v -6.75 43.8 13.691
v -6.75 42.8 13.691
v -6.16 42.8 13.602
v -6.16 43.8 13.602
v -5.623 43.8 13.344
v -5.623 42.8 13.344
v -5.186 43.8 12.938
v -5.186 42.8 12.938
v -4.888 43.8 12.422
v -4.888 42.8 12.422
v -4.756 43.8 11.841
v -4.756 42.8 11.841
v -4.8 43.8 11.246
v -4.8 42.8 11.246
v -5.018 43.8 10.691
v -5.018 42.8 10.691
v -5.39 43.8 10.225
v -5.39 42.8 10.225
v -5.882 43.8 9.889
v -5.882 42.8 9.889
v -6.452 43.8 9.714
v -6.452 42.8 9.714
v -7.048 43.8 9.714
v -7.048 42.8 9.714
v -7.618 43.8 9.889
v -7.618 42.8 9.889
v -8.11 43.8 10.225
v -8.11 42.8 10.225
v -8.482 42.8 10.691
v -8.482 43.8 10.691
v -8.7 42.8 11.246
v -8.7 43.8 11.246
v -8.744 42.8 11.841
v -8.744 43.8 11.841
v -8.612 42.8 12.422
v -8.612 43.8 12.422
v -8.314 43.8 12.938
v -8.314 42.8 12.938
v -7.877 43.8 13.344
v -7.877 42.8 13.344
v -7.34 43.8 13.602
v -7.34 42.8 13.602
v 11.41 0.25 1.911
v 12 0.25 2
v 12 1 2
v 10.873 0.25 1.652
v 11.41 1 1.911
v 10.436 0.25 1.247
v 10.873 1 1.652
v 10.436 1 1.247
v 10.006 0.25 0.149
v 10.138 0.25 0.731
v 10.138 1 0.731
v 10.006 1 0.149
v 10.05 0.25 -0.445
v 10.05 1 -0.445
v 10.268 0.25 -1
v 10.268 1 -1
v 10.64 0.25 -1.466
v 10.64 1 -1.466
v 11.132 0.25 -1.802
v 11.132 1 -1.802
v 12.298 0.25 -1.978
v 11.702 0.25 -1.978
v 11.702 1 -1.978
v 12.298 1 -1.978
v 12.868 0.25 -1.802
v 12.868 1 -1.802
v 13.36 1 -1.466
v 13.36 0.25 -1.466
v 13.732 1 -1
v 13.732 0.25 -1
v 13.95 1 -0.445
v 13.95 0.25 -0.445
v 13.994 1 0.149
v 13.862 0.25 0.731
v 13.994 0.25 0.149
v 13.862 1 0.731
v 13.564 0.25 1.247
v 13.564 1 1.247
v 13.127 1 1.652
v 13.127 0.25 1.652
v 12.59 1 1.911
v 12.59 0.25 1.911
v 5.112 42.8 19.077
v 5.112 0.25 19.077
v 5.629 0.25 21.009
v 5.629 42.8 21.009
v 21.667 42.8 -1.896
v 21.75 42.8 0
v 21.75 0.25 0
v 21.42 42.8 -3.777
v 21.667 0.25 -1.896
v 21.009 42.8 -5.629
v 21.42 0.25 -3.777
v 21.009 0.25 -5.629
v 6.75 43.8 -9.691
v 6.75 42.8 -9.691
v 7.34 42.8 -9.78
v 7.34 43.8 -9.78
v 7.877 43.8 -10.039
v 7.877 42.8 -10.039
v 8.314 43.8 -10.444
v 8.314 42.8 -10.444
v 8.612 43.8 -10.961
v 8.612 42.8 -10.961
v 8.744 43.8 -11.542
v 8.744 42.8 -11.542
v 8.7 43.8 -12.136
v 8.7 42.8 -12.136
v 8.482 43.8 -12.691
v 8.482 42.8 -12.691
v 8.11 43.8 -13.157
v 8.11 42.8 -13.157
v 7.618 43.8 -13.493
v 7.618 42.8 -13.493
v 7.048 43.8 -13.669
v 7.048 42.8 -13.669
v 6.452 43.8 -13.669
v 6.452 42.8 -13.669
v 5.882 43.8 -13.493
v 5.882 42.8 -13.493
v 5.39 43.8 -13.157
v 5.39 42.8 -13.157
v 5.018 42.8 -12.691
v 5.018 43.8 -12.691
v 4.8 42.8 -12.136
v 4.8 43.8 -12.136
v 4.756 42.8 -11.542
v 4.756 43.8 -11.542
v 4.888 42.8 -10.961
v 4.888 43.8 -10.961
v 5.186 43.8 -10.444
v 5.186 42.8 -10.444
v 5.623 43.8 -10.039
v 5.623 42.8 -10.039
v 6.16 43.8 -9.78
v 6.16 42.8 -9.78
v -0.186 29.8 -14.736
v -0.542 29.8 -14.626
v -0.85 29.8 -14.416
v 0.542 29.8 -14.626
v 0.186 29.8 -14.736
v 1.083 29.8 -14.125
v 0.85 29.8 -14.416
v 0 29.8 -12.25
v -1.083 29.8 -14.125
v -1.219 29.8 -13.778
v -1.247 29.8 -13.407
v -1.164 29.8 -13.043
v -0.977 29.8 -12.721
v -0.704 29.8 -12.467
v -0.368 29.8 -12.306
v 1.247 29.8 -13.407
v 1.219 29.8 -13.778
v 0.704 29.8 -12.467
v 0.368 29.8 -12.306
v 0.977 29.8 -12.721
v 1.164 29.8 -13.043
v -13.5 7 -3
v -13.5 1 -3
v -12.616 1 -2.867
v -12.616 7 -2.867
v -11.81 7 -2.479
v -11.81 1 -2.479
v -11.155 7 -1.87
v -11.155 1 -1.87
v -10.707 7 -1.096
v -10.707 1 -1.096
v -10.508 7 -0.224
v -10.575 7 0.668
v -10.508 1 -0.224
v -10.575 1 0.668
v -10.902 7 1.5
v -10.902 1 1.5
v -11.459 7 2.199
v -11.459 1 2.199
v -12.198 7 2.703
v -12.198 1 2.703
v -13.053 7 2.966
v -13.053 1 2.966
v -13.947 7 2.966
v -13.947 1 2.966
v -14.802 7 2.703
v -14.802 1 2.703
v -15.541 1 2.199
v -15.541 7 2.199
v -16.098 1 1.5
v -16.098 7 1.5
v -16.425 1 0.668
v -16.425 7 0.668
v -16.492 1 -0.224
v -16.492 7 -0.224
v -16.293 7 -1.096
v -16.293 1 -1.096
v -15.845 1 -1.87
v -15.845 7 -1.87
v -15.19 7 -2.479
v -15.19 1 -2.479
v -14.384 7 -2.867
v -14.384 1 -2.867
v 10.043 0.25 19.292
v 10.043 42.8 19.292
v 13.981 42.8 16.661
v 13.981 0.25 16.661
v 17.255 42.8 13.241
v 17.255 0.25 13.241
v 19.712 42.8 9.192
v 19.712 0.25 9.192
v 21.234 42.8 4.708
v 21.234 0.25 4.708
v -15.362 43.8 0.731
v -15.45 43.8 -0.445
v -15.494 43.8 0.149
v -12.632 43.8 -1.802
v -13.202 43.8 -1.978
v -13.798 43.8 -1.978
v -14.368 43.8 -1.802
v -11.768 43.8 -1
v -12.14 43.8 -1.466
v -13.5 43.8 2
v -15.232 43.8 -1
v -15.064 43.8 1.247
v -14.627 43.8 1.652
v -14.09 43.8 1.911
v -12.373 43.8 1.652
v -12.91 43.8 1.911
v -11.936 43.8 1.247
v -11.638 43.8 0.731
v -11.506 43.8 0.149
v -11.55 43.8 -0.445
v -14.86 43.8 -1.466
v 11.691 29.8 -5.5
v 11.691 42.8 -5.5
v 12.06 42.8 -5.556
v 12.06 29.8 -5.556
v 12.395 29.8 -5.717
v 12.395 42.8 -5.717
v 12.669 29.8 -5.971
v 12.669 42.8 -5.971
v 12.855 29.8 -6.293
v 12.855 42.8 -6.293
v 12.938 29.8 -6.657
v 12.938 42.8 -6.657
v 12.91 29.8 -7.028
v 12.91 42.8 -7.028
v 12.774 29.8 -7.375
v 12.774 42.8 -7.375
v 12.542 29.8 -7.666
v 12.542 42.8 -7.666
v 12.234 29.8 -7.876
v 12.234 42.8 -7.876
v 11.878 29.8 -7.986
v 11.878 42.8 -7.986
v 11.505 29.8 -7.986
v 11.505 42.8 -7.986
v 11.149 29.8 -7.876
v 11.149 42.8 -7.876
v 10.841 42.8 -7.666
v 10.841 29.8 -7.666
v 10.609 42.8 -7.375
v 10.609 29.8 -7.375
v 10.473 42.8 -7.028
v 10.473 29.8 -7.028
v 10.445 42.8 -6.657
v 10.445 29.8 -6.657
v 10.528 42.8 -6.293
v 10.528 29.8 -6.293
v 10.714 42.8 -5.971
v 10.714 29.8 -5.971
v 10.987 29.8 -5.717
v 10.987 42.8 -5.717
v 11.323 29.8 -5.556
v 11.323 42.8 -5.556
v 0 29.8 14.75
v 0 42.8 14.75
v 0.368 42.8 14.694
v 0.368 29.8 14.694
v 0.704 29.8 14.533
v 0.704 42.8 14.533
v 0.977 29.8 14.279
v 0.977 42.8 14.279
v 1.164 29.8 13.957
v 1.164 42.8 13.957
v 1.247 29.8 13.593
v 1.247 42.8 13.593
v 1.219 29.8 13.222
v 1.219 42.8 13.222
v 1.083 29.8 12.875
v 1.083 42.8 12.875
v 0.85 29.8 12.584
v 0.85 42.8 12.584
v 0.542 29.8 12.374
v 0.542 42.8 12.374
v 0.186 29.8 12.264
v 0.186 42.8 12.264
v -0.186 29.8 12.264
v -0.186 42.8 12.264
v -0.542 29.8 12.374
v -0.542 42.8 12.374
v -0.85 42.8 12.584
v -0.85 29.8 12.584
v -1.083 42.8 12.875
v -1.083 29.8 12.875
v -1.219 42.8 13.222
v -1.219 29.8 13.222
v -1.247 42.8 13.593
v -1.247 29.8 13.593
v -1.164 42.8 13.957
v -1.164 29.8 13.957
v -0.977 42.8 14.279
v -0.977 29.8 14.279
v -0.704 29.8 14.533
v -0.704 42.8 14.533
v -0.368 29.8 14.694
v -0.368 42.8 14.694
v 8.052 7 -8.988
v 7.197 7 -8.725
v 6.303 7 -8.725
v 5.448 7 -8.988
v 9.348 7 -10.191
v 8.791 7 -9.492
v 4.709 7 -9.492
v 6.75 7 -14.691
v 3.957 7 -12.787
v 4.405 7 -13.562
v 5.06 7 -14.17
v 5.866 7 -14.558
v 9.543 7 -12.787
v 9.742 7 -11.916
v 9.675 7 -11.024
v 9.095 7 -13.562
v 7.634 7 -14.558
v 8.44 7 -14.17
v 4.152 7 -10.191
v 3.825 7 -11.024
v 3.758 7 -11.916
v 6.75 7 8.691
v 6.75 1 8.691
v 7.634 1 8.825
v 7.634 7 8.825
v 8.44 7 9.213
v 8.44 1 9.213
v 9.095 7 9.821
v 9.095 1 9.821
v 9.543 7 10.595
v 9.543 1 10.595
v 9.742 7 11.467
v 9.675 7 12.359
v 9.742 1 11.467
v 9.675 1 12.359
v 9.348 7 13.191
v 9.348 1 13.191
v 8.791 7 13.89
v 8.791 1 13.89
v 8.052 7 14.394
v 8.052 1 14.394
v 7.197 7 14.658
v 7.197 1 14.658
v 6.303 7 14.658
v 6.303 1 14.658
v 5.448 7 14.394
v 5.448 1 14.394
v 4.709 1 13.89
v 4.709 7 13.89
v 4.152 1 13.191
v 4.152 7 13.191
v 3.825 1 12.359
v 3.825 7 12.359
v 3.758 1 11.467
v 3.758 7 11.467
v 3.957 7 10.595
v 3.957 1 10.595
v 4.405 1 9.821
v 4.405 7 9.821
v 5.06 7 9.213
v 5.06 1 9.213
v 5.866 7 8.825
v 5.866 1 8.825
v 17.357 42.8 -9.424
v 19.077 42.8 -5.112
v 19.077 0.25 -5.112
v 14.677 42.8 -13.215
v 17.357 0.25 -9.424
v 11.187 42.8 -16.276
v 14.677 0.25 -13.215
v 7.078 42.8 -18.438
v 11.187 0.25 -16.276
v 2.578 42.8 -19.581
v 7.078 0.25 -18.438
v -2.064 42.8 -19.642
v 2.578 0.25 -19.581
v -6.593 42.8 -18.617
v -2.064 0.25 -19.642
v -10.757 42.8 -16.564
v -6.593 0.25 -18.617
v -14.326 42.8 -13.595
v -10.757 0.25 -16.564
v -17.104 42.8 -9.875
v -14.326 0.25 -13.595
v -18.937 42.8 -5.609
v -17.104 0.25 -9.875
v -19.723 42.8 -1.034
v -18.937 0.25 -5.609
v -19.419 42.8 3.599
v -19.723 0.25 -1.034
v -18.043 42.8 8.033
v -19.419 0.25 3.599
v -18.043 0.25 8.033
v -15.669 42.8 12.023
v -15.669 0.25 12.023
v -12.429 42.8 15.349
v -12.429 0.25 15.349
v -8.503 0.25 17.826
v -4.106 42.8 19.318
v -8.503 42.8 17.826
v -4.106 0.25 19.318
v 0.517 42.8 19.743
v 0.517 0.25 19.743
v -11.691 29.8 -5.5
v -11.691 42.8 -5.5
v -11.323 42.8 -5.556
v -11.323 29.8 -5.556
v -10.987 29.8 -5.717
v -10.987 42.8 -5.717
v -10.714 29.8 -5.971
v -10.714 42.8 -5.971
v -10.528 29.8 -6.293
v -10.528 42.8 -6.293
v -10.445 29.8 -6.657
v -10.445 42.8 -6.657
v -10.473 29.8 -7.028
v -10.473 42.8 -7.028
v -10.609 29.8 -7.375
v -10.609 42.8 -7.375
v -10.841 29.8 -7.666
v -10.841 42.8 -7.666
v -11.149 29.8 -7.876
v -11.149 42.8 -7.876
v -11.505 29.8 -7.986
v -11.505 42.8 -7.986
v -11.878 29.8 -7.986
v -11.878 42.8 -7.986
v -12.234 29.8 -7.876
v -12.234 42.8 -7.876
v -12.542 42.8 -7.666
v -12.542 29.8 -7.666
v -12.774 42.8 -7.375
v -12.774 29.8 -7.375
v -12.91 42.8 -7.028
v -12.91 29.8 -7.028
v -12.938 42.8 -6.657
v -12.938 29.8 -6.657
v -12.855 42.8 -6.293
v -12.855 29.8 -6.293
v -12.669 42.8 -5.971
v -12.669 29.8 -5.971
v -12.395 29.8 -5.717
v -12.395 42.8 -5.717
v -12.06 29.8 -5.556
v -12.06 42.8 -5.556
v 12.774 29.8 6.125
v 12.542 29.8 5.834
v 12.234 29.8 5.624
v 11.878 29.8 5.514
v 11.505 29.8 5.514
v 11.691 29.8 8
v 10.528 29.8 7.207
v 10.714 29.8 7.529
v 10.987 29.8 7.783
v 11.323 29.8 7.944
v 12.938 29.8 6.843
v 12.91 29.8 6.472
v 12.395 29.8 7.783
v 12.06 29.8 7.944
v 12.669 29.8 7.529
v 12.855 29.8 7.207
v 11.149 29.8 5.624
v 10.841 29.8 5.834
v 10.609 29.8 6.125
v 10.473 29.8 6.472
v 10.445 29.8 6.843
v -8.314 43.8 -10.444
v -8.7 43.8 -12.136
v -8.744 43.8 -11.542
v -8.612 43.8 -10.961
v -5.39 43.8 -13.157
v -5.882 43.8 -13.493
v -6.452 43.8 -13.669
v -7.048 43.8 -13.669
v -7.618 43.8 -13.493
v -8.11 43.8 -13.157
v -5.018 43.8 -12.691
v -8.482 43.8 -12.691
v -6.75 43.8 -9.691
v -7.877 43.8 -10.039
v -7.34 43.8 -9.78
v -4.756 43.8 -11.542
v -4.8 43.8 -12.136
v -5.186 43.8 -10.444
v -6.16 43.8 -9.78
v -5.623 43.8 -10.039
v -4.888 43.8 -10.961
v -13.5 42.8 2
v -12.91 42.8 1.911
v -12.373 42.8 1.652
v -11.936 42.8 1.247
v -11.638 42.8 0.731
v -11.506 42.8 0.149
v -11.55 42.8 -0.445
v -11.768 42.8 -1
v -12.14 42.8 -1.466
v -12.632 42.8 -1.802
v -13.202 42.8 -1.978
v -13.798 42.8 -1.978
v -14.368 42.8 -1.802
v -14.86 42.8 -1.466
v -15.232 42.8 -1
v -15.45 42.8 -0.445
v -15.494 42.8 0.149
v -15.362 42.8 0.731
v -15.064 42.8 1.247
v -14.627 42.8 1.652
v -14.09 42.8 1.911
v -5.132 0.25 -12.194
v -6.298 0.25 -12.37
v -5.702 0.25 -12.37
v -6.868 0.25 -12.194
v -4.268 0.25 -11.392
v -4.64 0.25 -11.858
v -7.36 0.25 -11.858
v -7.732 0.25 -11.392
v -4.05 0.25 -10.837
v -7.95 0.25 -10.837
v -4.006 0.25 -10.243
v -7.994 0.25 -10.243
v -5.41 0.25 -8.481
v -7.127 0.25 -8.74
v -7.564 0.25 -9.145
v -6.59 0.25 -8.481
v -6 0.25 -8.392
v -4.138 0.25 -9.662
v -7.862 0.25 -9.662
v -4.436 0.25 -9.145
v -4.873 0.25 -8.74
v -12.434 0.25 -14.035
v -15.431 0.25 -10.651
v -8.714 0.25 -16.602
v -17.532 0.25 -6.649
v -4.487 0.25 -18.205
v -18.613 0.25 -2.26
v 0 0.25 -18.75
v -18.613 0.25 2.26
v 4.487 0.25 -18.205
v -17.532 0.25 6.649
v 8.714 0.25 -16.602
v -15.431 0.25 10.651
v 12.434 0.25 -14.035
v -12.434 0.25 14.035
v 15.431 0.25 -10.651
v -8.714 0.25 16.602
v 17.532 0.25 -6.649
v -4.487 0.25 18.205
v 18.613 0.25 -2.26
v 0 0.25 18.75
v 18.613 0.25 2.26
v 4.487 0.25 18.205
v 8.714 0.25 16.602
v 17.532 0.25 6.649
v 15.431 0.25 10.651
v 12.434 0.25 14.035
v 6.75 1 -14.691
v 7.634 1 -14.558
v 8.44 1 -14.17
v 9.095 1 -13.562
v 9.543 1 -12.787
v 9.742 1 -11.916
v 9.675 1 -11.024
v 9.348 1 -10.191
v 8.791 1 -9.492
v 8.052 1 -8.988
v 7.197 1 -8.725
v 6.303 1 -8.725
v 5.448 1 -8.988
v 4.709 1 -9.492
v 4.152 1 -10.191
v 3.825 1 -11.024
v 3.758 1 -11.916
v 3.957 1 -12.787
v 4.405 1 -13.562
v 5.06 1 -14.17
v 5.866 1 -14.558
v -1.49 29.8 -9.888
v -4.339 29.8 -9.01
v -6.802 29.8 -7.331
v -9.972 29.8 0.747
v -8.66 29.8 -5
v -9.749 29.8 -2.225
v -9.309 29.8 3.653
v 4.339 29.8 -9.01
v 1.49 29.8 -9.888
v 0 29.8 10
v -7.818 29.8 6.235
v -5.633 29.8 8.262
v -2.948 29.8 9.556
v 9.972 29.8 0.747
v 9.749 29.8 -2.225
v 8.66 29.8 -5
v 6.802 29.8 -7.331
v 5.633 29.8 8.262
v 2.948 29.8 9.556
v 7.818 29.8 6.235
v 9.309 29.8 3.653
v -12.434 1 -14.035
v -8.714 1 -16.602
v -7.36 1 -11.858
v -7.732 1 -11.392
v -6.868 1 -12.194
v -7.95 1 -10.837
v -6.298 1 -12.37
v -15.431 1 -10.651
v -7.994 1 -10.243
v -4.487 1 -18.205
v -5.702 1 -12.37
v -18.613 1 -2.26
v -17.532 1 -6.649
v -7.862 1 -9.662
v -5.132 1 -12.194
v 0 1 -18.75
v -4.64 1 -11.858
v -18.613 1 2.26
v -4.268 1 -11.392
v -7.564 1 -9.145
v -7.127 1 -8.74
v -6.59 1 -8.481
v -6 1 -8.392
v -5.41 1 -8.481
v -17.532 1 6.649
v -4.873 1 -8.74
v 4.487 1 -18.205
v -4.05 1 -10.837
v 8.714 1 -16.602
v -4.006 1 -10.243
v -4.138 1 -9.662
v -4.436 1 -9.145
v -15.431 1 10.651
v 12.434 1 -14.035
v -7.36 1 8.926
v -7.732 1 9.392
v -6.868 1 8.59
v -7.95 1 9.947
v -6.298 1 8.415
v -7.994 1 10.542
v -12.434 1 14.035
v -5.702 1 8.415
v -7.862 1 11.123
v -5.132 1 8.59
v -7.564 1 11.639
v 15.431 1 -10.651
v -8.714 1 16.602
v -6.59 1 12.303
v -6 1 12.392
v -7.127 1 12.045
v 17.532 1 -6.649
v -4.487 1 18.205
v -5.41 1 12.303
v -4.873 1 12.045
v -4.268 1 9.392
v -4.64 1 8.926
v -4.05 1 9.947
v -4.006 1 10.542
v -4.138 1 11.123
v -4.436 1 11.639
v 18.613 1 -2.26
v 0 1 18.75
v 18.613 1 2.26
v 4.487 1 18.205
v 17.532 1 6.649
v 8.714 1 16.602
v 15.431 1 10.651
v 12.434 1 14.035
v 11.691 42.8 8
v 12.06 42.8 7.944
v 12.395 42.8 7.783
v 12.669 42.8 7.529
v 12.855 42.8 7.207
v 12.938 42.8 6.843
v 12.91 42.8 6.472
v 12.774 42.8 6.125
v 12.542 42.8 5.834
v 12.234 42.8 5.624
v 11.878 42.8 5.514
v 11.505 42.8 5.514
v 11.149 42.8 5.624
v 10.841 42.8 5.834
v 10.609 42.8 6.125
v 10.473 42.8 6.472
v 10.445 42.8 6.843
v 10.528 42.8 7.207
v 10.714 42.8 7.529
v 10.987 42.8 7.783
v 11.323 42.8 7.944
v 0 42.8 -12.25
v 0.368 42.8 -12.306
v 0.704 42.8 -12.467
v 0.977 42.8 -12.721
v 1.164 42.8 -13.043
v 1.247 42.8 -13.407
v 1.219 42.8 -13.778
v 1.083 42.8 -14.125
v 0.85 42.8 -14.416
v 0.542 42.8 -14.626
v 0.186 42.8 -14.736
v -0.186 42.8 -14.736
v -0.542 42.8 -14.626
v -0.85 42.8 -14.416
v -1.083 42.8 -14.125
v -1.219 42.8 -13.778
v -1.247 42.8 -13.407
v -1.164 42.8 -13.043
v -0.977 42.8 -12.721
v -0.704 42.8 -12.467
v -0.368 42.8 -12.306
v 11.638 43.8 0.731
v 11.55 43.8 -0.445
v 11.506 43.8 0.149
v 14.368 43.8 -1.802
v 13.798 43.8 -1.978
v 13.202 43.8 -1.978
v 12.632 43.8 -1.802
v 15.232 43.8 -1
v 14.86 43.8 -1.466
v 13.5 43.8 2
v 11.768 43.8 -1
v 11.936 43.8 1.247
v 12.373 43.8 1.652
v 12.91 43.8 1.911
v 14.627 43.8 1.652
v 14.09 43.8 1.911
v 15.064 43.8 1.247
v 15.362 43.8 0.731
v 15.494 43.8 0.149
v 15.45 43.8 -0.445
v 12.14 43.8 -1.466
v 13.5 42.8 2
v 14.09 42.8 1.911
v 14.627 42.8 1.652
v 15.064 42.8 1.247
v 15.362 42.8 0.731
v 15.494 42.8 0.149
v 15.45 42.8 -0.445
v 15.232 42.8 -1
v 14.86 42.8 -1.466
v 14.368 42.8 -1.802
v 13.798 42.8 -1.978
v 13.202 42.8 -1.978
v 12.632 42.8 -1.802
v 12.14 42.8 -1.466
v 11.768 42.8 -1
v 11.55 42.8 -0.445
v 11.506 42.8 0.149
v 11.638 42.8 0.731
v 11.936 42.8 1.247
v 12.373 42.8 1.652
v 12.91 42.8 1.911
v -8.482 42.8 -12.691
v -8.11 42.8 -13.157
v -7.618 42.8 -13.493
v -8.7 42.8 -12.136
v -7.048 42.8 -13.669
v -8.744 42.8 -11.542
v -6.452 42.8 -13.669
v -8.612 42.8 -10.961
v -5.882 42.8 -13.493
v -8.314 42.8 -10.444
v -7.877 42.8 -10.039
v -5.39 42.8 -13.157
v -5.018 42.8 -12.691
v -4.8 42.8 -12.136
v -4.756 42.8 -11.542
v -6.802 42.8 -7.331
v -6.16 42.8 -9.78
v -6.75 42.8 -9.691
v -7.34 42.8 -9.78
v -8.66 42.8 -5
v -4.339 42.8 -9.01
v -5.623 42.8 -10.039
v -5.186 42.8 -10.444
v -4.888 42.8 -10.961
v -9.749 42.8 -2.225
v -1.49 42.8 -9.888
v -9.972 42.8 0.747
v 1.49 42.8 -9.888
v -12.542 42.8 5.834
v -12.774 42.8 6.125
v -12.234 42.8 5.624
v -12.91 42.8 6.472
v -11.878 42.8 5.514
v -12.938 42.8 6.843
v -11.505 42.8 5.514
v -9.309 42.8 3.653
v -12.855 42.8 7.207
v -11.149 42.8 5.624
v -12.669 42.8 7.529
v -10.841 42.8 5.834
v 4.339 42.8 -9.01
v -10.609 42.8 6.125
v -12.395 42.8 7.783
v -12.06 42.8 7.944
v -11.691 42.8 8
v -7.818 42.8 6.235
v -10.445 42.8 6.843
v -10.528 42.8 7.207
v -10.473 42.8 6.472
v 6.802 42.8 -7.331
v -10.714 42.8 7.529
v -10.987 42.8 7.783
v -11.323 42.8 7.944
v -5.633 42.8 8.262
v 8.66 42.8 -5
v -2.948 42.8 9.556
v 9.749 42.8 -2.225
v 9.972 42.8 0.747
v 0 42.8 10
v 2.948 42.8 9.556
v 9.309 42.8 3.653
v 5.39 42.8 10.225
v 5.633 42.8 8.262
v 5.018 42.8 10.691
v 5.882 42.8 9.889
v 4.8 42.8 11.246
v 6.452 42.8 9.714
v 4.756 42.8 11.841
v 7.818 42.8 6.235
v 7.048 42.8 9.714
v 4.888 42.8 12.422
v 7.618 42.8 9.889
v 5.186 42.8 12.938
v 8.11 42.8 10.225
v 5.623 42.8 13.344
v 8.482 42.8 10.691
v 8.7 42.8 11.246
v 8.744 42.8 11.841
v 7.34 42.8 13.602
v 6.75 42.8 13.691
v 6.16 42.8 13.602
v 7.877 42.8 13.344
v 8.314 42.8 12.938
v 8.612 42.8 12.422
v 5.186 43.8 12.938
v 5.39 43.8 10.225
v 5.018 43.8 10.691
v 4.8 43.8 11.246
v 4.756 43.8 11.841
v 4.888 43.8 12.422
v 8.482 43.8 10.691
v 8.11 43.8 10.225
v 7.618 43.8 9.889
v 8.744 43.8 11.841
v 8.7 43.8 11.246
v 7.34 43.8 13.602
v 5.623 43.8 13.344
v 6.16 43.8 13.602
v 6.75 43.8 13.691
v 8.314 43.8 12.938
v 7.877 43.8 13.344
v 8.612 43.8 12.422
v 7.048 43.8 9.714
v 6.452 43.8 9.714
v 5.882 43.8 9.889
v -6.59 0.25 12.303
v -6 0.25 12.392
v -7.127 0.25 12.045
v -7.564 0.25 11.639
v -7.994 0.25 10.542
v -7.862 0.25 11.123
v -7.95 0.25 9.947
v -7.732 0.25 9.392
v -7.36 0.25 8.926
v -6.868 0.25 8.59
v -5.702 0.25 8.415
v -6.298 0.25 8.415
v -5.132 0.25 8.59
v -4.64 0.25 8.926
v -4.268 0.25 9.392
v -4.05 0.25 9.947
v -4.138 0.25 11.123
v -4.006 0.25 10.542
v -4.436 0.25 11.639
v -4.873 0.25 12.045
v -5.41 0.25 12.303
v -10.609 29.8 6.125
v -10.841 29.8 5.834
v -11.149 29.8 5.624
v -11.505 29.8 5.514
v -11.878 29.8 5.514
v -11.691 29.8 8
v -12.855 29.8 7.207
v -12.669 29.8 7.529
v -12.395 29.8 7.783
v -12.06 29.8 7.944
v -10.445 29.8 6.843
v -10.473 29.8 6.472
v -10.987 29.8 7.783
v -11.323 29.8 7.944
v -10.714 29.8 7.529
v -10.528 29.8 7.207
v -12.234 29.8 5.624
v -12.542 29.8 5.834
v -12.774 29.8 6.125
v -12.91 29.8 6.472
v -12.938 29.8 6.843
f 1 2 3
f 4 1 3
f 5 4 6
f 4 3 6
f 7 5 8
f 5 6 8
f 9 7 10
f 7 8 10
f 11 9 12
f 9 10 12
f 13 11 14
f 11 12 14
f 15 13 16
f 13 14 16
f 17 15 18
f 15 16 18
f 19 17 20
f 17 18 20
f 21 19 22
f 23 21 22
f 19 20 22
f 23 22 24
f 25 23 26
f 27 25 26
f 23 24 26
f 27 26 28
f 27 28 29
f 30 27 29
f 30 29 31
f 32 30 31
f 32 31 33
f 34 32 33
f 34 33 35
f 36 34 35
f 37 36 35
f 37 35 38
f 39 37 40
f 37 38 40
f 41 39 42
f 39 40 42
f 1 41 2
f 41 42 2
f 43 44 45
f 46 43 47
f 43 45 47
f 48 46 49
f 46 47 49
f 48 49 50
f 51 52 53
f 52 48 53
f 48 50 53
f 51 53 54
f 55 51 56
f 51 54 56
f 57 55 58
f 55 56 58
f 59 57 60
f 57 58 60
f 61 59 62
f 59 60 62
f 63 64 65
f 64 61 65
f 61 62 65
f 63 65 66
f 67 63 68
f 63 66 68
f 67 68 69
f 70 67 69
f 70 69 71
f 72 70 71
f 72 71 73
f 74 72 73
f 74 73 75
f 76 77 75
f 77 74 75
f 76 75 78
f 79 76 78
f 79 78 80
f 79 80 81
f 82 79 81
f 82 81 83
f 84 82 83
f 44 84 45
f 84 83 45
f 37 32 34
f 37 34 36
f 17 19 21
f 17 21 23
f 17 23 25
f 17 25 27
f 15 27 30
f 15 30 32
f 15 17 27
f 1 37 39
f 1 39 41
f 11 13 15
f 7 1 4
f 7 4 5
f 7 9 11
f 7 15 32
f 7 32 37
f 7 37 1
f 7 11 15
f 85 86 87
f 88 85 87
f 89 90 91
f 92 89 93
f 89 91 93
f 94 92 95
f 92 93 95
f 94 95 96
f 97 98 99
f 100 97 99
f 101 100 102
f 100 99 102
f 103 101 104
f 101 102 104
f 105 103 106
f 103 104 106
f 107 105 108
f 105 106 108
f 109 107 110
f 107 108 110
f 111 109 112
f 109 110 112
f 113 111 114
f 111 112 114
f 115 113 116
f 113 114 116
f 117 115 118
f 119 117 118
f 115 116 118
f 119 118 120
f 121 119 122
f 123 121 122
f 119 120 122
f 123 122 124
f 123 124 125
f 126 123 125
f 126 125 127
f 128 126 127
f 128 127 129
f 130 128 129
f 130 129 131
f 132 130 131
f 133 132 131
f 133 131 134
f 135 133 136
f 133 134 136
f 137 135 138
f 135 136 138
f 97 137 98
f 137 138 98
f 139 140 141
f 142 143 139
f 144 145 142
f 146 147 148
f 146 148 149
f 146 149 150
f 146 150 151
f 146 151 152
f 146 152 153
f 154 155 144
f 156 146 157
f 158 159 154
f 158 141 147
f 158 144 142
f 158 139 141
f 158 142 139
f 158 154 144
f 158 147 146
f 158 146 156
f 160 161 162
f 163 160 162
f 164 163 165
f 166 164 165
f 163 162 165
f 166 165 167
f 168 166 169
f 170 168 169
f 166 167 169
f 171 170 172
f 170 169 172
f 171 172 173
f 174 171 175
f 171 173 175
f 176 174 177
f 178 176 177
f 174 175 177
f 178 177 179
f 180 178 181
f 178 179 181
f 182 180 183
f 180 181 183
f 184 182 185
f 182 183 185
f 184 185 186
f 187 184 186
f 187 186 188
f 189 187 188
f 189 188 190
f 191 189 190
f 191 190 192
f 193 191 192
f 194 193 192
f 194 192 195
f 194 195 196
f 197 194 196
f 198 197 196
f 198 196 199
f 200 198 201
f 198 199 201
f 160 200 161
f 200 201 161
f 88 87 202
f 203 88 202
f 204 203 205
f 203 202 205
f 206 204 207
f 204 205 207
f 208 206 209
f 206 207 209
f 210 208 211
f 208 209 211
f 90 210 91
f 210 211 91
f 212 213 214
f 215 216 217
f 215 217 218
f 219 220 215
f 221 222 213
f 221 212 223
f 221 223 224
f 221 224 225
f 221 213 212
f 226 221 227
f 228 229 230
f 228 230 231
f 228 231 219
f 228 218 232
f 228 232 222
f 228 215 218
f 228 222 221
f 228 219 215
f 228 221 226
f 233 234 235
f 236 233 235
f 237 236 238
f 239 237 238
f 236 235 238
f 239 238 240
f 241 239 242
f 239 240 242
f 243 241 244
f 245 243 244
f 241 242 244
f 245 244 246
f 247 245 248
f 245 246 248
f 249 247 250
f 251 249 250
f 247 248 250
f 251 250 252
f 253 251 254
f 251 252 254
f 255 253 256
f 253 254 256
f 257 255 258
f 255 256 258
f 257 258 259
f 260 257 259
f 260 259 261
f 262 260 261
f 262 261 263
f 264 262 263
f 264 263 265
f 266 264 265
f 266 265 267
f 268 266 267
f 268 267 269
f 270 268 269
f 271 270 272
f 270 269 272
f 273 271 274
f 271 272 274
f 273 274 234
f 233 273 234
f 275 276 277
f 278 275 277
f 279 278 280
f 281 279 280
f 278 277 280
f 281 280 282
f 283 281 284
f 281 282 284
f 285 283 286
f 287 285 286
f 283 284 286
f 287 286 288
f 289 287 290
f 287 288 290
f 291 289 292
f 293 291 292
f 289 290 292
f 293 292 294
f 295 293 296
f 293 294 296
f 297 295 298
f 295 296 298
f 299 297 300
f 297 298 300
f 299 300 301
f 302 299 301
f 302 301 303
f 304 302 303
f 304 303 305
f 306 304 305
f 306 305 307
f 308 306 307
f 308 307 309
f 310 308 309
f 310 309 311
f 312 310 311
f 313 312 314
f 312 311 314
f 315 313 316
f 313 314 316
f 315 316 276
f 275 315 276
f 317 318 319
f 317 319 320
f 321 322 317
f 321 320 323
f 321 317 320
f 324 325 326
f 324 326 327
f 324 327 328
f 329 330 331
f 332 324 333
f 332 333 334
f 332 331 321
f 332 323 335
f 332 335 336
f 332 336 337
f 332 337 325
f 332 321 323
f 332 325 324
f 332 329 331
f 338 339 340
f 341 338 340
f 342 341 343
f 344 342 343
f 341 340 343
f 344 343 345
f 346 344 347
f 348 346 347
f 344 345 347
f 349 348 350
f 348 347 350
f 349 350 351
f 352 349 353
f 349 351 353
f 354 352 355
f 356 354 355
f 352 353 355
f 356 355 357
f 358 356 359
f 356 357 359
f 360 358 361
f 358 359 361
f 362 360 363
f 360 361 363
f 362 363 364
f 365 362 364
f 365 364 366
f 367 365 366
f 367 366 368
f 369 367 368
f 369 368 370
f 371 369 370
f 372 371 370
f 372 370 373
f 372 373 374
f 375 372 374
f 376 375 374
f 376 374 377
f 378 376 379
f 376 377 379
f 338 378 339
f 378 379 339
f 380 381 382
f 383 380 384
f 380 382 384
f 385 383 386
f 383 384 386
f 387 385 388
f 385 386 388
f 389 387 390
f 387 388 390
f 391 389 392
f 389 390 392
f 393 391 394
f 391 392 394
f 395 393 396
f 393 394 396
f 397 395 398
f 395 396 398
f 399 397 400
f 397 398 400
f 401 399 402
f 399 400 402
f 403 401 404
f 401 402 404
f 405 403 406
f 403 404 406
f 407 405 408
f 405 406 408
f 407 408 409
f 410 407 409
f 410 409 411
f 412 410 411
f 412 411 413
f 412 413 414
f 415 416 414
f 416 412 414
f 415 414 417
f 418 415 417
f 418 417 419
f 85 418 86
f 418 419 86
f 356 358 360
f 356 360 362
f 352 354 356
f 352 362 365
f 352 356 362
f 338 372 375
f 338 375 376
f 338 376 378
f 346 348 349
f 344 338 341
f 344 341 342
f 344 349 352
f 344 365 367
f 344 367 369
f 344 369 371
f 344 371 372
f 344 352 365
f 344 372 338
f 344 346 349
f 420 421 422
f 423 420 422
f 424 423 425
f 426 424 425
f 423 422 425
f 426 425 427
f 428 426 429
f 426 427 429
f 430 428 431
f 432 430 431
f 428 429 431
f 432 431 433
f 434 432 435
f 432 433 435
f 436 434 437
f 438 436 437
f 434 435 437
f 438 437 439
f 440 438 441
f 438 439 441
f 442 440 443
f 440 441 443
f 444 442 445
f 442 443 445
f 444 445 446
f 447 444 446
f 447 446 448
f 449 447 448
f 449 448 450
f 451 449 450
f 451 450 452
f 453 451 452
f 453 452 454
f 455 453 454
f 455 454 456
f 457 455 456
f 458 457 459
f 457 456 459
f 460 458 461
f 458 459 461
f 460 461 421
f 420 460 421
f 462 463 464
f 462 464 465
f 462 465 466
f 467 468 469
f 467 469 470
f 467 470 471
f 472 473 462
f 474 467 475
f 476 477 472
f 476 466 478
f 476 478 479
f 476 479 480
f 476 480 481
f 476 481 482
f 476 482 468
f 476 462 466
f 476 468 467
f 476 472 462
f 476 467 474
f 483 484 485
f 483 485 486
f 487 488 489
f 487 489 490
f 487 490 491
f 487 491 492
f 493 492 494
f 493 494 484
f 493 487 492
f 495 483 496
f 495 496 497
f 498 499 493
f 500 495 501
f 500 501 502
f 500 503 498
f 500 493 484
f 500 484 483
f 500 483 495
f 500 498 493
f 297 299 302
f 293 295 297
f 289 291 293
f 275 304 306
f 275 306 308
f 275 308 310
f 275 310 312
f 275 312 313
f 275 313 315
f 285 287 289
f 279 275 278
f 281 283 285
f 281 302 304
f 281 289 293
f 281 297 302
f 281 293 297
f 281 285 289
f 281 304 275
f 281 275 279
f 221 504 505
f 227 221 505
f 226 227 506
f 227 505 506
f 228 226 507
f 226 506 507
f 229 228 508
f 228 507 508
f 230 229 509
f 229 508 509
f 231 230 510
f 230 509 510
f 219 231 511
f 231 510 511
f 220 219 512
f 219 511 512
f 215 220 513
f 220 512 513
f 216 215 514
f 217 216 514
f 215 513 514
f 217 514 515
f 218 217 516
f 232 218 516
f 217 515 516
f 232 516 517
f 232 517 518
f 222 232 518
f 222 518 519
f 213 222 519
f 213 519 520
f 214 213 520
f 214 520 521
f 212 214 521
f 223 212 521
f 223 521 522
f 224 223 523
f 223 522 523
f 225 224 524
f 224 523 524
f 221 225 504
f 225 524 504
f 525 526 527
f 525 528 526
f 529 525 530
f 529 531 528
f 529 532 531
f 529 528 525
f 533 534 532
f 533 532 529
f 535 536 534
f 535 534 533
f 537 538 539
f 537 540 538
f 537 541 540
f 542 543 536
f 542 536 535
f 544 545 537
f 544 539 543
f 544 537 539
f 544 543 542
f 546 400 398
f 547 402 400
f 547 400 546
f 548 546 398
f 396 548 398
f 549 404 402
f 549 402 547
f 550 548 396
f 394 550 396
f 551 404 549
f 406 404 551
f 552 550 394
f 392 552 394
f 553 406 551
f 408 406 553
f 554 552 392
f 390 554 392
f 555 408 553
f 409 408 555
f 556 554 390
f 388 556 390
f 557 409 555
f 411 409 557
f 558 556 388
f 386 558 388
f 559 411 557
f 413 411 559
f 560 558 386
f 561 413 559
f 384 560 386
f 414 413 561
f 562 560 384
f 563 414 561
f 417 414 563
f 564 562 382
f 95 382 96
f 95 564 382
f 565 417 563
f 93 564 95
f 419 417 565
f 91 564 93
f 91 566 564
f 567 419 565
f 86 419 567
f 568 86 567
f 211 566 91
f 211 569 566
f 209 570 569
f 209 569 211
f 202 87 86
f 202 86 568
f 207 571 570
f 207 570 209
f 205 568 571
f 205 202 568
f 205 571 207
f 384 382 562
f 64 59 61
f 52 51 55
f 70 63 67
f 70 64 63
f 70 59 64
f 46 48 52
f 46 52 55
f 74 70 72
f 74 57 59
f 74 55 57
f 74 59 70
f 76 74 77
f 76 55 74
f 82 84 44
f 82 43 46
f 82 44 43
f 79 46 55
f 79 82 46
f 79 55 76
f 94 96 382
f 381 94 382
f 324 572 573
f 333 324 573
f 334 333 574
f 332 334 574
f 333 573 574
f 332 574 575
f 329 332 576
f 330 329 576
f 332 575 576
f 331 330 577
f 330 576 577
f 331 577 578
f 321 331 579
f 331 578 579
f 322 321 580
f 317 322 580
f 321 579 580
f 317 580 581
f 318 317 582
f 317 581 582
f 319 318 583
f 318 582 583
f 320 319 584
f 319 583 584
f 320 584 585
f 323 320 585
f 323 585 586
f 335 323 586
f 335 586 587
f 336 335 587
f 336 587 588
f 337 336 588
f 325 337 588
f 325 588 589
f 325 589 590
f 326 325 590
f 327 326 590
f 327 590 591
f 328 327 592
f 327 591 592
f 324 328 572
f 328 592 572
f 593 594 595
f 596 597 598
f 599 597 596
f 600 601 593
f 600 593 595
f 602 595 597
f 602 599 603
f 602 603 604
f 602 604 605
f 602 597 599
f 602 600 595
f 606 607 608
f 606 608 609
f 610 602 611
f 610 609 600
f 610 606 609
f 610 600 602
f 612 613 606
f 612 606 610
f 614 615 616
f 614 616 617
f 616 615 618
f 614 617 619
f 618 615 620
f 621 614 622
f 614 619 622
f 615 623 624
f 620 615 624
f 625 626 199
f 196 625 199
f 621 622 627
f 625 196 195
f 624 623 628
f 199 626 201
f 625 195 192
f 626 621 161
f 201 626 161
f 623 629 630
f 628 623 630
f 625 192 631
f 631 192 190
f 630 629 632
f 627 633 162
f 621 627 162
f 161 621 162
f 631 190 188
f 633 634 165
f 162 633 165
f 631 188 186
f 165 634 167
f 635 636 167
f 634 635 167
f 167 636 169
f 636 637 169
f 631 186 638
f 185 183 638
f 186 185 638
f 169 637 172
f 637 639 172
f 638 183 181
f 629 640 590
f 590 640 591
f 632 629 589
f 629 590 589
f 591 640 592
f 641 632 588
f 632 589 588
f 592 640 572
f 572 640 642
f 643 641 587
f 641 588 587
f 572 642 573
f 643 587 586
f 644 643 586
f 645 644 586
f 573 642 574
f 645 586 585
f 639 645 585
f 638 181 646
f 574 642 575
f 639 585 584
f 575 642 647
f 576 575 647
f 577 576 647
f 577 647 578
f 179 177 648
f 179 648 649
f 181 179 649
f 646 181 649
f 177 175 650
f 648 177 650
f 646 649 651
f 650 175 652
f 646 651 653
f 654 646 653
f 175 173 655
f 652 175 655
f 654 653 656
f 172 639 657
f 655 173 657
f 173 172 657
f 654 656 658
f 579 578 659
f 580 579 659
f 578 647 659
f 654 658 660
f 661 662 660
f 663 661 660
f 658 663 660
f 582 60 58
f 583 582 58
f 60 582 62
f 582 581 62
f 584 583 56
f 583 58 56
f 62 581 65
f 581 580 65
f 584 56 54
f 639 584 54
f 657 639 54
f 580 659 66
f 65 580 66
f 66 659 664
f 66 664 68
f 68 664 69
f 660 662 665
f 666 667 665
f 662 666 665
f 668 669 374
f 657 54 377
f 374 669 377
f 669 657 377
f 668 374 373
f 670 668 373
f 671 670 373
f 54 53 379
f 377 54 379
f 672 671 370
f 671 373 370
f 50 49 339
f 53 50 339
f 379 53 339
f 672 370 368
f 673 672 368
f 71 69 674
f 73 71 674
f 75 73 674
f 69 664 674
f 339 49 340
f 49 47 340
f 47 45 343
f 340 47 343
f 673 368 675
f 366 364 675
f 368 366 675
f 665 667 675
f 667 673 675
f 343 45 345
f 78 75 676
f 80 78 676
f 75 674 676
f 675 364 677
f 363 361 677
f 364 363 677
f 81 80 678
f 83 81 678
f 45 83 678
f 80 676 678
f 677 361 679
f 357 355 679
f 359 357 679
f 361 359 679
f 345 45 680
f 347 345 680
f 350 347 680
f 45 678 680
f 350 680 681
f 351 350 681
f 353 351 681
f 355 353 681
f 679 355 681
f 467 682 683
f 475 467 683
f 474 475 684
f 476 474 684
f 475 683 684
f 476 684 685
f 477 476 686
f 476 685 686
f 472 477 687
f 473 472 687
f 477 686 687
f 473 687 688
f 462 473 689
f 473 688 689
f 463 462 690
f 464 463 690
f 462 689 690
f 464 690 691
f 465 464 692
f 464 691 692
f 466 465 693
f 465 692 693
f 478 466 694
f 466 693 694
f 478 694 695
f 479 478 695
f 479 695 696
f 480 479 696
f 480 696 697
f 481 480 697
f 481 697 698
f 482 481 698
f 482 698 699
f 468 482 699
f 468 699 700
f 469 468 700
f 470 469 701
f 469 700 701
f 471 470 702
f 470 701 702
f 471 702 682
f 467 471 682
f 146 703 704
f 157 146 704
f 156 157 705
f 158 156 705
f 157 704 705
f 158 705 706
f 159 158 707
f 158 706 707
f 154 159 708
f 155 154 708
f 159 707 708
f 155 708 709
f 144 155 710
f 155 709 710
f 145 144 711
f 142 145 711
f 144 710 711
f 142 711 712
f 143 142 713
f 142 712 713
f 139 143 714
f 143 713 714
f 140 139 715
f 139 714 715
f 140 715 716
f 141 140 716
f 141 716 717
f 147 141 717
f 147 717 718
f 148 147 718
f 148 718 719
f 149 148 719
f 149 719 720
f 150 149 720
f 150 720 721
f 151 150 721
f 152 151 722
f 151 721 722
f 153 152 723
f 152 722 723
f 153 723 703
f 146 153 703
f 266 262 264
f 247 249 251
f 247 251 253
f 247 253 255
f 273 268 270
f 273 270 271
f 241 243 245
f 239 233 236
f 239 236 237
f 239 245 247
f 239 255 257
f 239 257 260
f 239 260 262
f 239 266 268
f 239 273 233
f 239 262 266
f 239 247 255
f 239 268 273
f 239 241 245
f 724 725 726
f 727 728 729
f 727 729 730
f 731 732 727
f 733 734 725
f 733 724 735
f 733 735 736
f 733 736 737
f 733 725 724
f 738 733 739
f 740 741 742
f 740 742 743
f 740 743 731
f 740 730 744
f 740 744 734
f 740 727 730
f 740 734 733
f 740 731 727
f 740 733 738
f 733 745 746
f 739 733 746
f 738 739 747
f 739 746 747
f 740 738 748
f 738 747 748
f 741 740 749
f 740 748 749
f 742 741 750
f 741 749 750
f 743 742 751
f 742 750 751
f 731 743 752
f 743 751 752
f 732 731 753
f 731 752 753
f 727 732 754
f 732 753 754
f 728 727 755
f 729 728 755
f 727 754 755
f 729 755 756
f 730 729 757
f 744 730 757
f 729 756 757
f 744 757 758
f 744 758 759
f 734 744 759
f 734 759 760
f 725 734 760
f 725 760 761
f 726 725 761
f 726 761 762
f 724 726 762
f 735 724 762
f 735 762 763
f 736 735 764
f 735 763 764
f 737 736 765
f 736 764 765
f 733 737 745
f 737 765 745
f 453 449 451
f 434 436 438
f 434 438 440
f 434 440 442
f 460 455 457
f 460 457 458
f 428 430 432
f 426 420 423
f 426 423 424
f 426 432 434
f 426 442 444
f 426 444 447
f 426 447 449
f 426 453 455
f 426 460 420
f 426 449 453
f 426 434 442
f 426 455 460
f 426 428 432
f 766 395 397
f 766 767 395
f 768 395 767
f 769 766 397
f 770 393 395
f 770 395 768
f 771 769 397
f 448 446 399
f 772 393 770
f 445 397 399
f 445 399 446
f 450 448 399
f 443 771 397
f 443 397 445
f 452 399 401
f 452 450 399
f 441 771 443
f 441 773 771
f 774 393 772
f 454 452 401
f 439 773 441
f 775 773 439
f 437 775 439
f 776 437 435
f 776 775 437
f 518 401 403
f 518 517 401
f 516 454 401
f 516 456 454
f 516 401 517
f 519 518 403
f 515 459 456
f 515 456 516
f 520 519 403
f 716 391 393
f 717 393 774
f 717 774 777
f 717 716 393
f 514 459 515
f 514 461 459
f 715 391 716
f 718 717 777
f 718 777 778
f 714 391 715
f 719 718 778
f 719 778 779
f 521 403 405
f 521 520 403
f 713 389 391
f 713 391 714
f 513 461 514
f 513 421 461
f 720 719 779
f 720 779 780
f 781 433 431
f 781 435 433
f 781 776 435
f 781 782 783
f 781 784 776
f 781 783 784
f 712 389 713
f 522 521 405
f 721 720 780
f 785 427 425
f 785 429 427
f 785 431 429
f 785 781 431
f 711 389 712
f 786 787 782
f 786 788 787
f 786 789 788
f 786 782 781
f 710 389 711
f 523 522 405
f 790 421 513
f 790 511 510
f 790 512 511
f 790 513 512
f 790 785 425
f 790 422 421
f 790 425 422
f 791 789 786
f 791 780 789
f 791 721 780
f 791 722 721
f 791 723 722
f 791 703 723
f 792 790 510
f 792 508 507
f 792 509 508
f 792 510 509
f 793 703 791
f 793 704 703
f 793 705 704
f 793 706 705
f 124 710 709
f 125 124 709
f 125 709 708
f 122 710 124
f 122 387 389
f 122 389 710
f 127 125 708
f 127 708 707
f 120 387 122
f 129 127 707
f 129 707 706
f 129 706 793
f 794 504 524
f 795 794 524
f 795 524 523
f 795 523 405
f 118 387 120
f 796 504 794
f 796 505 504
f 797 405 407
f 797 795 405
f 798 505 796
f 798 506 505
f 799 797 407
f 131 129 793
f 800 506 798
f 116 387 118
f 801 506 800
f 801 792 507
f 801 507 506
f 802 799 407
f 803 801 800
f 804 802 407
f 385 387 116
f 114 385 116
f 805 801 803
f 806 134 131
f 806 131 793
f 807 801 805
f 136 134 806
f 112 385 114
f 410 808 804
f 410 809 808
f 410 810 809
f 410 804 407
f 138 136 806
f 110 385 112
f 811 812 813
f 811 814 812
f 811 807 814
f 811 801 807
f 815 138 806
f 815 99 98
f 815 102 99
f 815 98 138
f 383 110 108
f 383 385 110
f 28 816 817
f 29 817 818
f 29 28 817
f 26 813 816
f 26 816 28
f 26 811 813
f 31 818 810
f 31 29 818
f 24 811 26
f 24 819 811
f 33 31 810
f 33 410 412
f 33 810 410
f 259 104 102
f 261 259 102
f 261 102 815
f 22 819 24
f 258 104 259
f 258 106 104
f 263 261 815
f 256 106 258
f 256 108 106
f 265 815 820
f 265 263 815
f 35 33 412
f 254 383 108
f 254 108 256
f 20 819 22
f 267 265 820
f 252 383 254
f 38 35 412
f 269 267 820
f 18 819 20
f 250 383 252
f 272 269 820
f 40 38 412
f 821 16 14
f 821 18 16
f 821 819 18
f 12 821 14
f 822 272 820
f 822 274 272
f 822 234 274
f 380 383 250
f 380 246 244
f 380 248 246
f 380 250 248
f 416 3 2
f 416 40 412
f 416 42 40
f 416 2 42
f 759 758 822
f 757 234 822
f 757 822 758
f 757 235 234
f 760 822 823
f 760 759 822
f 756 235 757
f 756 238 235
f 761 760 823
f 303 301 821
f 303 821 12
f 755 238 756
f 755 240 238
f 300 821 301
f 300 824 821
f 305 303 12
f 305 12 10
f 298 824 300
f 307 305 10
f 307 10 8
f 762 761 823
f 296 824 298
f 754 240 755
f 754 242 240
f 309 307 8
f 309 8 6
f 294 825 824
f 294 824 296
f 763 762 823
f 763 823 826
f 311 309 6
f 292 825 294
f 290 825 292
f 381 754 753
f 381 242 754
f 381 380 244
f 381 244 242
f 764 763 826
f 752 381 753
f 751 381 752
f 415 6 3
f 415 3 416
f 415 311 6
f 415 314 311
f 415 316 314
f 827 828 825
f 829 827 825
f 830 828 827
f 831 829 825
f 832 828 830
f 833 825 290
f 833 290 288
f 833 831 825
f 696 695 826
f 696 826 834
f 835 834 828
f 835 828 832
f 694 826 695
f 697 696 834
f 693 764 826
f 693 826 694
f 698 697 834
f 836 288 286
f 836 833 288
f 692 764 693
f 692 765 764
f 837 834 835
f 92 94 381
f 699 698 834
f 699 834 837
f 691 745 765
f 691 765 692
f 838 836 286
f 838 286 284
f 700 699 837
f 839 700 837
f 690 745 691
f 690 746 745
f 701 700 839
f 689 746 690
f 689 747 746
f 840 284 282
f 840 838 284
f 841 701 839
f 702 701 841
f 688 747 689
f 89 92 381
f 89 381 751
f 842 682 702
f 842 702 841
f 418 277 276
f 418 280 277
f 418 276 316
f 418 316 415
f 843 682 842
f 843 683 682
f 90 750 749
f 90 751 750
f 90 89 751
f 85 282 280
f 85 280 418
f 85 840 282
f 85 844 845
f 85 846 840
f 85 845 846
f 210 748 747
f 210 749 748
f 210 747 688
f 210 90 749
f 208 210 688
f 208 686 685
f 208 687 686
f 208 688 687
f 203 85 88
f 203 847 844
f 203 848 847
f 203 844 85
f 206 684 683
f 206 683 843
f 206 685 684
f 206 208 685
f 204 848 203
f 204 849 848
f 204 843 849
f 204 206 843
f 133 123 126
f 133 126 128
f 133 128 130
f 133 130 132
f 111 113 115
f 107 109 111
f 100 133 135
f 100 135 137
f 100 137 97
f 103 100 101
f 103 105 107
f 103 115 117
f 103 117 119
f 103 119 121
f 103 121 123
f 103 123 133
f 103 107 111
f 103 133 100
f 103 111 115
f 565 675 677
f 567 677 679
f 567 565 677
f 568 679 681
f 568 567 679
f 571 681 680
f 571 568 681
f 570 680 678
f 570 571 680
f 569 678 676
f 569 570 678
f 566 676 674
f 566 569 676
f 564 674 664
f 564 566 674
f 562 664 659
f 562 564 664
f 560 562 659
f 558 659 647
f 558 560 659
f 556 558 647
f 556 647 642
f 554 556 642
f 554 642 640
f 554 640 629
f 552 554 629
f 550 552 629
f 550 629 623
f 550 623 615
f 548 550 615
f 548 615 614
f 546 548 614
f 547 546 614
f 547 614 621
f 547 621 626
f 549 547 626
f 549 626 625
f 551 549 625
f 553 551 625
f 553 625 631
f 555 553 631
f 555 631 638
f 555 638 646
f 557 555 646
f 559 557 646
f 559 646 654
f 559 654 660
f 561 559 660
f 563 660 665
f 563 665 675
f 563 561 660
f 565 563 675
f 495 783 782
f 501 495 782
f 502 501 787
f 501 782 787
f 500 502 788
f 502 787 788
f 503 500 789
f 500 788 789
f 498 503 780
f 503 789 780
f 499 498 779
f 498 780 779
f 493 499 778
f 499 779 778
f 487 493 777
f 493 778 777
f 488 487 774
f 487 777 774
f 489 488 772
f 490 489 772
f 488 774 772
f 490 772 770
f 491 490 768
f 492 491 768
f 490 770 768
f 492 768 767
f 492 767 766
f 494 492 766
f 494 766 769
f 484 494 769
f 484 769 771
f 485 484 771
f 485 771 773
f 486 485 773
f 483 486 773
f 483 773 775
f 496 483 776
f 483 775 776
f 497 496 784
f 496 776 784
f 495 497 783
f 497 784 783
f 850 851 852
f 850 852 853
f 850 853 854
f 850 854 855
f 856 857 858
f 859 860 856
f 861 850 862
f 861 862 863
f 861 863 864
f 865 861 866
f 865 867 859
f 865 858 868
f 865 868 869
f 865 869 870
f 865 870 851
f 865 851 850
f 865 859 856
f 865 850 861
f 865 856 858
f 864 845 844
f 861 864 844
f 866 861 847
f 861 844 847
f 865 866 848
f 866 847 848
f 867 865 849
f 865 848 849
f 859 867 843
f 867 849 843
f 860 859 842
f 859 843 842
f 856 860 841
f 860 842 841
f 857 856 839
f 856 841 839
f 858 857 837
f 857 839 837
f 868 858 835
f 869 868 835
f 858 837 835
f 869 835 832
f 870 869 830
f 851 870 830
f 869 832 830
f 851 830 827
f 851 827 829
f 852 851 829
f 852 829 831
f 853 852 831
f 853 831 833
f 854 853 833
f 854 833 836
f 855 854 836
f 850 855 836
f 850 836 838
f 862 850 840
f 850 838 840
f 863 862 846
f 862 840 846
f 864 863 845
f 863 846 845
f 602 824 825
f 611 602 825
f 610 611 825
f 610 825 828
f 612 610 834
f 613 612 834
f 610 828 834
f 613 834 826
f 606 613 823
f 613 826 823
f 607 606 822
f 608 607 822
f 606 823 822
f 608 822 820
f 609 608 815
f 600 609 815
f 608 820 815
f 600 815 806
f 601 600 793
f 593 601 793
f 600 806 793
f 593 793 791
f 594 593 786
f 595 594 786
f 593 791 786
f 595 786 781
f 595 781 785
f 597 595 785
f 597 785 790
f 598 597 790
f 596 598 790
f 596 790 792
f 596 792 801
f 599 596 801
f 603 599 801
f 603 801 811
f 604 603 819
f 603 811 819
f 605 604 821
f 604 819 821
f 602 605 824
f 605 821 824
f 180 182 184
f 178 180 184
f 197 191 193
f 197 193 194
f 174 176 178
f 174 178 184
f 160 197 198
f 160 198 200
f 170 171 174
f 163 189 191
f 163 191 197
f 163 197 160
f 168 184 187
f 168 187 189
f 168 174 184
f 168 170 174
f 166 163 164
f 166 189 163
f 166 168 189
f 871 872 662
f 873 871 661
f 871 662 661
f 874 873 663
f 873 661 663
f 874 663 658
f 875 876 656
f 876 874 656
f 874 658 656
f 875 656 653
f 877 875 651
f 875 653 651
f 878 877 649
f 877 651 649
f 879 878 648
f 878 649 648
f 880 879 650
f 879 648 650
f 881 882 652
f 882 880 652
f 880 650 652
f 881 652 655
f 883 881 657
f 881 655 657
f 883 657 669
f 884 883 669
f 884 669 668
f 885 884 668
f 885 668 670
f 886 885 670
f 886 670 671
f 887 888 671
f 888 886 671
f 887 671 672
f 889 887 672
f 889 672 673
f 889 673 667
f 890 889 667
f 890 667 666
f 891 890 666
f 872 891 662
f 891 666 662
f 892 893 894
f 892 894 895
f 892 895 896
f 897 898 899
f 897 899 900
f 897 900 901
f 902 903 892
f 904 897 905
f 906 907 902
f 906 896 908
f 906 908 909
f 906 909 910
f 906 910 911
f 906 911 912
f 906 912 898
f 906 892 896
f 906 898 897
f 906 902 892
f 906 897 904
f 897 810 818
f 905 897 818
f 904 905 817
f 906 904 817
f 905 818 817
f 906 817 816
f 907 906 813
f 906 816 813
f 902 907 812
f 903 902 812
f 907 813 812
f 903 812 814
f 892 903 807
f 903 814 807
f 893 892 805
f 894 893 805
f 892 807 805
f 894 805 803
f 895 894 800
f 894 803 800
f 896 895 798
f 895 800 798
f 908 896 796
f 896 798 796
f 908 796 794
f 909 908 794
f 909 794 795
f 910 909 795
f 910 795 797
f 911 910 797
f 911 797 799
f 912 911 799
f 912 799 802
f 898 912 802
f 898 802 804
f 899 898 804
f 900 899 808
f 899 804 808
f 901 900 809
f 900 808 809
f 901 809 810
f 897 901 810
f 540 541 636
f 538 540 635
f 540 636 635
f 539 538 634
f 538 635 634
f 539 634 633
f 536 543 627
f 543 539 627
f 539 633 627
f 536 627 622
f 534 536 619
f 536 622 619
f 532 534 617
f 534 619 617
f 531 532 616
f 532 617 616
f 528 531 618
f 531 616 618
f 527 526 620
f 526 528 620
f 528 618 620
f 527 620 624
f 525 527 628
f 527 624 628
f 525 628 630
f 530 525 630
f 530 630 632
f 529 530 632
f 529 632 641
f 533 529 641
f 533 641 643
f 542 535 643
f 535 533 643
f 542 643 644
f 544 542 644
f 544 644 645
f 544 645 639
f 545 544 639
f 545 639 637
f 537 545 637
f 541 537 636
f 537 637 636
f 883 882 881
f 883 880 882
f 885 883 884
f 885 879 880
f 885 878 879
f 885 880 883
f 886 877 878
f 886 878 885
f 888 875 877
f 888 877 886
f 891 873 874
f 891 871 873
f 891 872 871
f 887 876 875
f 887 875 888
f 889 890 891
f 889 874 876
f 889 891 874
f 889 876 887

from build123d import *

# Parameters (mm, degrees)
SKETCH_1_R          = 19.75
SKETCH_1_R_2        = 18.75
EXTRUDE_1_DEPTH     = 1
SKETCH_2_R          = 19.75
EXTRUDE_2_DEPTH     = 41.8
SKETCH_3_R          = 10
SKETCH_3_R_2        = 1.25
CUT_EXTRUDE_1_DEPTH = 13
SKETCH_4_R          = 2
EXTRUDE_3_DEPTH     = 1
SKETCH_5_R          = 2
EXTRUDE_4_DEPTH     = 1
SKETCH_6_R          = 3
CUT_EXTRUDE_2_DEPTH = 6
EXTRUDE_START       = -42.8
EXTRUDE_5_DEPTH     = 42.8
SKETCH_9_R          = 25
CUT_EXTRUDE_4_DEPTH = 0.25


with BuildPart() as part:
    # 草图1 → 凸台-拉伸1 (new body)
    with BuildSketch(Plane(origin=(0, 0, 0), x_dir=(1, 0, 0), z_dir=(0, 1, 0))):
        with Locations(Location((0, 0, 0), (0, 0, 270))):
            Circle(SKETCH_1_R)
        with Locations(Location((0, 0, 0), (0, 0, 270))):
            Circle(SKETCH_1_R_2, mode=Mode.SUBTRACT)
    extrude(amount=EXTRUDE_1_DEPTH)

    # 草图2 → 凸台-拉伸2 (add)
    with BuildSketch(Plane(origin=(0, 1, 0), x_dir=(1, 0, 0), z_dir=(0, 1, 0))):
        with Locations(Location((0, 0, 0), (0, 0, 270))):
            Circle(SKETCH_2_R)
    extrude(amount=EXTRUDE_2_DEPTH)

    # 草图3 → 切除-拉伸1 (cut)
    with BuildSketch(Plane(origin=(0, 42.8, 0), x_dir=(1, 0, 0), z_dir=(0, 1, 0))):
        with Locations(Location((0, 0, 0), (0, 0, 270))):
            Circle(SKETCH_3_R)
        with Locations(Location((0, 13.5, 0), (0, 0, 270))):
            Circle(SKETCH_3_R_2)
        with Locations(Location((11.691342951, 6.75, 0), (0, 0, 270))):
            Circle(SKETCH_3_R_2)
        with Locations(Location((11.691342951, -6.75, 0), (0, 0, 270))):
            Circle(SKETCH_3_R_2)
        with Locations(Location((0, -13.5, 0), (0, 0, 270))):
            Circle(SKETCH_3_R_2)
        with Locations(Location((-11.691342951, -6.75, 0), (0, 0, 270))):
            Circle(SKETCH_3_R_2)
        with Locations(Location((-11.691342951, 6.75, 0), (0, 0, 270))):
            Circle(SKETCH_3_R_2)
    extrude(amount=-CUT_EXTRUDE_1_DEPTH, mode=Mode.SUBTRACT)

    # 草图4 → 凸台-拉伸3 (add)
    with BuildSketch(Plane.XZ.offset(-1)):
        with Locations(Location((12, 0, 0), (0, 0, 90))):
            Circle(SKETCH_4_R)
        with Locations(Location((-6, -10.392304845, 0), (0, 0, 90))):
            Circle(SKETCH_4_R)
        with Locations(Location((-6, 10.392304845, 0), (0, 0, 90))):
            Circle(SKETCH_4_R)
    extrude(amount=EXTRUDE_3_DEPTH)

    # 草图5 → 凸台-拉伸4 (add)
    with BuildSketch(Plane(origin=(0, 42.8, 0), x_dir=(1, 0, 0), z_dir=(0, 1, 0))):
        with Locations(Location((13.5, 0, 0), (0, 0, 270))):
            Circle(SKETCH_5_R)
        with Locations(Location((6.75, -11.691342951, 0), (0, 0, 270))):
            Circle(SKETCH_5_R)
        with Locations(Location((-6.75, -11.691342951, 0), (0, 0, 270))):
            Circle(SKETCH_5_R)
        with Locations(Location((-13.5, 0, 0), (0, 0, 270))):
            Circle(SKETCH_5_R)
        with Locations(Location((-6.75, 11.691342951, 0), (0, 0, 270))):
            Circle(SKETCH_5_R)
        with Locations(Location((6.75, 11.691342951, 0), (0, 0, 270))):
            Circle(SKETCH_5_R)
    extrude(amount=EXTRUDE_4_DEPTH)

    # 草图6 → 切除-拉伸2 (cut)
    with BuildSketch(Plane.XZ.offset(-1)):
        with Locations(Location((-13.5, 0, 0), (0, 0, 270))):
            Circle(SKETCH_6_R)
        with Locations(Location((6.75, 11.691342951, 0), (0, 0, 270))):
            Circle(SKETCH_6_R)
        with Locations(Location((6.75, -11.691342951, 0), (0, 0, 270))):
            Circle(SKETCH_6_R)
    extrude(amount=-CUT_EXTRUDE_2_DEPTH, mode=Mode.SUBTRACT)

    # 草图7 → 凸台-拉伸5 (add)
    with BuildSketch(Plane(origin=(0, 42.8, 0), x_dir=(1, 0, 0), z_dir=(0, 1, 0)).offset(EXTRUDE_START)):
        with BuildLine():
            ThreePointArc((21.75, 0), (21.563925735, 2.838944681), (21.008886722, 5.629314231))
            Line((21.008886722, 5.629314231), (19.077035069, 5.111676141))
            ThreePointArc((19.077035069, 5.111676141), (19.581036012, 2.577892296), (19.75, 0))
            ThreePointArc((19.75, 0), (15.668728471, -12.023038223), (5.111676141, -19.077035069))
            Line((5.111676141, -19.077035069), (5.629314231, -21.008886722))
            ThreePointArc((5.629314231, -21.008886722), (17.255435151, -13.240561081), (21.75, 0))
        make_face()
    extrude(amount=EXTRUDE_5_DEPTH)

    # 草图9 → 切除-拉伸4 (cut)
    with BuildSketch(Plane.XZ):
        Circle(SKETCH_9_R)
    extrude(amount=-CUT_EXTRUDE_4_DEPTH, mode=Mode.SUBTRACT)


solid = part.part
